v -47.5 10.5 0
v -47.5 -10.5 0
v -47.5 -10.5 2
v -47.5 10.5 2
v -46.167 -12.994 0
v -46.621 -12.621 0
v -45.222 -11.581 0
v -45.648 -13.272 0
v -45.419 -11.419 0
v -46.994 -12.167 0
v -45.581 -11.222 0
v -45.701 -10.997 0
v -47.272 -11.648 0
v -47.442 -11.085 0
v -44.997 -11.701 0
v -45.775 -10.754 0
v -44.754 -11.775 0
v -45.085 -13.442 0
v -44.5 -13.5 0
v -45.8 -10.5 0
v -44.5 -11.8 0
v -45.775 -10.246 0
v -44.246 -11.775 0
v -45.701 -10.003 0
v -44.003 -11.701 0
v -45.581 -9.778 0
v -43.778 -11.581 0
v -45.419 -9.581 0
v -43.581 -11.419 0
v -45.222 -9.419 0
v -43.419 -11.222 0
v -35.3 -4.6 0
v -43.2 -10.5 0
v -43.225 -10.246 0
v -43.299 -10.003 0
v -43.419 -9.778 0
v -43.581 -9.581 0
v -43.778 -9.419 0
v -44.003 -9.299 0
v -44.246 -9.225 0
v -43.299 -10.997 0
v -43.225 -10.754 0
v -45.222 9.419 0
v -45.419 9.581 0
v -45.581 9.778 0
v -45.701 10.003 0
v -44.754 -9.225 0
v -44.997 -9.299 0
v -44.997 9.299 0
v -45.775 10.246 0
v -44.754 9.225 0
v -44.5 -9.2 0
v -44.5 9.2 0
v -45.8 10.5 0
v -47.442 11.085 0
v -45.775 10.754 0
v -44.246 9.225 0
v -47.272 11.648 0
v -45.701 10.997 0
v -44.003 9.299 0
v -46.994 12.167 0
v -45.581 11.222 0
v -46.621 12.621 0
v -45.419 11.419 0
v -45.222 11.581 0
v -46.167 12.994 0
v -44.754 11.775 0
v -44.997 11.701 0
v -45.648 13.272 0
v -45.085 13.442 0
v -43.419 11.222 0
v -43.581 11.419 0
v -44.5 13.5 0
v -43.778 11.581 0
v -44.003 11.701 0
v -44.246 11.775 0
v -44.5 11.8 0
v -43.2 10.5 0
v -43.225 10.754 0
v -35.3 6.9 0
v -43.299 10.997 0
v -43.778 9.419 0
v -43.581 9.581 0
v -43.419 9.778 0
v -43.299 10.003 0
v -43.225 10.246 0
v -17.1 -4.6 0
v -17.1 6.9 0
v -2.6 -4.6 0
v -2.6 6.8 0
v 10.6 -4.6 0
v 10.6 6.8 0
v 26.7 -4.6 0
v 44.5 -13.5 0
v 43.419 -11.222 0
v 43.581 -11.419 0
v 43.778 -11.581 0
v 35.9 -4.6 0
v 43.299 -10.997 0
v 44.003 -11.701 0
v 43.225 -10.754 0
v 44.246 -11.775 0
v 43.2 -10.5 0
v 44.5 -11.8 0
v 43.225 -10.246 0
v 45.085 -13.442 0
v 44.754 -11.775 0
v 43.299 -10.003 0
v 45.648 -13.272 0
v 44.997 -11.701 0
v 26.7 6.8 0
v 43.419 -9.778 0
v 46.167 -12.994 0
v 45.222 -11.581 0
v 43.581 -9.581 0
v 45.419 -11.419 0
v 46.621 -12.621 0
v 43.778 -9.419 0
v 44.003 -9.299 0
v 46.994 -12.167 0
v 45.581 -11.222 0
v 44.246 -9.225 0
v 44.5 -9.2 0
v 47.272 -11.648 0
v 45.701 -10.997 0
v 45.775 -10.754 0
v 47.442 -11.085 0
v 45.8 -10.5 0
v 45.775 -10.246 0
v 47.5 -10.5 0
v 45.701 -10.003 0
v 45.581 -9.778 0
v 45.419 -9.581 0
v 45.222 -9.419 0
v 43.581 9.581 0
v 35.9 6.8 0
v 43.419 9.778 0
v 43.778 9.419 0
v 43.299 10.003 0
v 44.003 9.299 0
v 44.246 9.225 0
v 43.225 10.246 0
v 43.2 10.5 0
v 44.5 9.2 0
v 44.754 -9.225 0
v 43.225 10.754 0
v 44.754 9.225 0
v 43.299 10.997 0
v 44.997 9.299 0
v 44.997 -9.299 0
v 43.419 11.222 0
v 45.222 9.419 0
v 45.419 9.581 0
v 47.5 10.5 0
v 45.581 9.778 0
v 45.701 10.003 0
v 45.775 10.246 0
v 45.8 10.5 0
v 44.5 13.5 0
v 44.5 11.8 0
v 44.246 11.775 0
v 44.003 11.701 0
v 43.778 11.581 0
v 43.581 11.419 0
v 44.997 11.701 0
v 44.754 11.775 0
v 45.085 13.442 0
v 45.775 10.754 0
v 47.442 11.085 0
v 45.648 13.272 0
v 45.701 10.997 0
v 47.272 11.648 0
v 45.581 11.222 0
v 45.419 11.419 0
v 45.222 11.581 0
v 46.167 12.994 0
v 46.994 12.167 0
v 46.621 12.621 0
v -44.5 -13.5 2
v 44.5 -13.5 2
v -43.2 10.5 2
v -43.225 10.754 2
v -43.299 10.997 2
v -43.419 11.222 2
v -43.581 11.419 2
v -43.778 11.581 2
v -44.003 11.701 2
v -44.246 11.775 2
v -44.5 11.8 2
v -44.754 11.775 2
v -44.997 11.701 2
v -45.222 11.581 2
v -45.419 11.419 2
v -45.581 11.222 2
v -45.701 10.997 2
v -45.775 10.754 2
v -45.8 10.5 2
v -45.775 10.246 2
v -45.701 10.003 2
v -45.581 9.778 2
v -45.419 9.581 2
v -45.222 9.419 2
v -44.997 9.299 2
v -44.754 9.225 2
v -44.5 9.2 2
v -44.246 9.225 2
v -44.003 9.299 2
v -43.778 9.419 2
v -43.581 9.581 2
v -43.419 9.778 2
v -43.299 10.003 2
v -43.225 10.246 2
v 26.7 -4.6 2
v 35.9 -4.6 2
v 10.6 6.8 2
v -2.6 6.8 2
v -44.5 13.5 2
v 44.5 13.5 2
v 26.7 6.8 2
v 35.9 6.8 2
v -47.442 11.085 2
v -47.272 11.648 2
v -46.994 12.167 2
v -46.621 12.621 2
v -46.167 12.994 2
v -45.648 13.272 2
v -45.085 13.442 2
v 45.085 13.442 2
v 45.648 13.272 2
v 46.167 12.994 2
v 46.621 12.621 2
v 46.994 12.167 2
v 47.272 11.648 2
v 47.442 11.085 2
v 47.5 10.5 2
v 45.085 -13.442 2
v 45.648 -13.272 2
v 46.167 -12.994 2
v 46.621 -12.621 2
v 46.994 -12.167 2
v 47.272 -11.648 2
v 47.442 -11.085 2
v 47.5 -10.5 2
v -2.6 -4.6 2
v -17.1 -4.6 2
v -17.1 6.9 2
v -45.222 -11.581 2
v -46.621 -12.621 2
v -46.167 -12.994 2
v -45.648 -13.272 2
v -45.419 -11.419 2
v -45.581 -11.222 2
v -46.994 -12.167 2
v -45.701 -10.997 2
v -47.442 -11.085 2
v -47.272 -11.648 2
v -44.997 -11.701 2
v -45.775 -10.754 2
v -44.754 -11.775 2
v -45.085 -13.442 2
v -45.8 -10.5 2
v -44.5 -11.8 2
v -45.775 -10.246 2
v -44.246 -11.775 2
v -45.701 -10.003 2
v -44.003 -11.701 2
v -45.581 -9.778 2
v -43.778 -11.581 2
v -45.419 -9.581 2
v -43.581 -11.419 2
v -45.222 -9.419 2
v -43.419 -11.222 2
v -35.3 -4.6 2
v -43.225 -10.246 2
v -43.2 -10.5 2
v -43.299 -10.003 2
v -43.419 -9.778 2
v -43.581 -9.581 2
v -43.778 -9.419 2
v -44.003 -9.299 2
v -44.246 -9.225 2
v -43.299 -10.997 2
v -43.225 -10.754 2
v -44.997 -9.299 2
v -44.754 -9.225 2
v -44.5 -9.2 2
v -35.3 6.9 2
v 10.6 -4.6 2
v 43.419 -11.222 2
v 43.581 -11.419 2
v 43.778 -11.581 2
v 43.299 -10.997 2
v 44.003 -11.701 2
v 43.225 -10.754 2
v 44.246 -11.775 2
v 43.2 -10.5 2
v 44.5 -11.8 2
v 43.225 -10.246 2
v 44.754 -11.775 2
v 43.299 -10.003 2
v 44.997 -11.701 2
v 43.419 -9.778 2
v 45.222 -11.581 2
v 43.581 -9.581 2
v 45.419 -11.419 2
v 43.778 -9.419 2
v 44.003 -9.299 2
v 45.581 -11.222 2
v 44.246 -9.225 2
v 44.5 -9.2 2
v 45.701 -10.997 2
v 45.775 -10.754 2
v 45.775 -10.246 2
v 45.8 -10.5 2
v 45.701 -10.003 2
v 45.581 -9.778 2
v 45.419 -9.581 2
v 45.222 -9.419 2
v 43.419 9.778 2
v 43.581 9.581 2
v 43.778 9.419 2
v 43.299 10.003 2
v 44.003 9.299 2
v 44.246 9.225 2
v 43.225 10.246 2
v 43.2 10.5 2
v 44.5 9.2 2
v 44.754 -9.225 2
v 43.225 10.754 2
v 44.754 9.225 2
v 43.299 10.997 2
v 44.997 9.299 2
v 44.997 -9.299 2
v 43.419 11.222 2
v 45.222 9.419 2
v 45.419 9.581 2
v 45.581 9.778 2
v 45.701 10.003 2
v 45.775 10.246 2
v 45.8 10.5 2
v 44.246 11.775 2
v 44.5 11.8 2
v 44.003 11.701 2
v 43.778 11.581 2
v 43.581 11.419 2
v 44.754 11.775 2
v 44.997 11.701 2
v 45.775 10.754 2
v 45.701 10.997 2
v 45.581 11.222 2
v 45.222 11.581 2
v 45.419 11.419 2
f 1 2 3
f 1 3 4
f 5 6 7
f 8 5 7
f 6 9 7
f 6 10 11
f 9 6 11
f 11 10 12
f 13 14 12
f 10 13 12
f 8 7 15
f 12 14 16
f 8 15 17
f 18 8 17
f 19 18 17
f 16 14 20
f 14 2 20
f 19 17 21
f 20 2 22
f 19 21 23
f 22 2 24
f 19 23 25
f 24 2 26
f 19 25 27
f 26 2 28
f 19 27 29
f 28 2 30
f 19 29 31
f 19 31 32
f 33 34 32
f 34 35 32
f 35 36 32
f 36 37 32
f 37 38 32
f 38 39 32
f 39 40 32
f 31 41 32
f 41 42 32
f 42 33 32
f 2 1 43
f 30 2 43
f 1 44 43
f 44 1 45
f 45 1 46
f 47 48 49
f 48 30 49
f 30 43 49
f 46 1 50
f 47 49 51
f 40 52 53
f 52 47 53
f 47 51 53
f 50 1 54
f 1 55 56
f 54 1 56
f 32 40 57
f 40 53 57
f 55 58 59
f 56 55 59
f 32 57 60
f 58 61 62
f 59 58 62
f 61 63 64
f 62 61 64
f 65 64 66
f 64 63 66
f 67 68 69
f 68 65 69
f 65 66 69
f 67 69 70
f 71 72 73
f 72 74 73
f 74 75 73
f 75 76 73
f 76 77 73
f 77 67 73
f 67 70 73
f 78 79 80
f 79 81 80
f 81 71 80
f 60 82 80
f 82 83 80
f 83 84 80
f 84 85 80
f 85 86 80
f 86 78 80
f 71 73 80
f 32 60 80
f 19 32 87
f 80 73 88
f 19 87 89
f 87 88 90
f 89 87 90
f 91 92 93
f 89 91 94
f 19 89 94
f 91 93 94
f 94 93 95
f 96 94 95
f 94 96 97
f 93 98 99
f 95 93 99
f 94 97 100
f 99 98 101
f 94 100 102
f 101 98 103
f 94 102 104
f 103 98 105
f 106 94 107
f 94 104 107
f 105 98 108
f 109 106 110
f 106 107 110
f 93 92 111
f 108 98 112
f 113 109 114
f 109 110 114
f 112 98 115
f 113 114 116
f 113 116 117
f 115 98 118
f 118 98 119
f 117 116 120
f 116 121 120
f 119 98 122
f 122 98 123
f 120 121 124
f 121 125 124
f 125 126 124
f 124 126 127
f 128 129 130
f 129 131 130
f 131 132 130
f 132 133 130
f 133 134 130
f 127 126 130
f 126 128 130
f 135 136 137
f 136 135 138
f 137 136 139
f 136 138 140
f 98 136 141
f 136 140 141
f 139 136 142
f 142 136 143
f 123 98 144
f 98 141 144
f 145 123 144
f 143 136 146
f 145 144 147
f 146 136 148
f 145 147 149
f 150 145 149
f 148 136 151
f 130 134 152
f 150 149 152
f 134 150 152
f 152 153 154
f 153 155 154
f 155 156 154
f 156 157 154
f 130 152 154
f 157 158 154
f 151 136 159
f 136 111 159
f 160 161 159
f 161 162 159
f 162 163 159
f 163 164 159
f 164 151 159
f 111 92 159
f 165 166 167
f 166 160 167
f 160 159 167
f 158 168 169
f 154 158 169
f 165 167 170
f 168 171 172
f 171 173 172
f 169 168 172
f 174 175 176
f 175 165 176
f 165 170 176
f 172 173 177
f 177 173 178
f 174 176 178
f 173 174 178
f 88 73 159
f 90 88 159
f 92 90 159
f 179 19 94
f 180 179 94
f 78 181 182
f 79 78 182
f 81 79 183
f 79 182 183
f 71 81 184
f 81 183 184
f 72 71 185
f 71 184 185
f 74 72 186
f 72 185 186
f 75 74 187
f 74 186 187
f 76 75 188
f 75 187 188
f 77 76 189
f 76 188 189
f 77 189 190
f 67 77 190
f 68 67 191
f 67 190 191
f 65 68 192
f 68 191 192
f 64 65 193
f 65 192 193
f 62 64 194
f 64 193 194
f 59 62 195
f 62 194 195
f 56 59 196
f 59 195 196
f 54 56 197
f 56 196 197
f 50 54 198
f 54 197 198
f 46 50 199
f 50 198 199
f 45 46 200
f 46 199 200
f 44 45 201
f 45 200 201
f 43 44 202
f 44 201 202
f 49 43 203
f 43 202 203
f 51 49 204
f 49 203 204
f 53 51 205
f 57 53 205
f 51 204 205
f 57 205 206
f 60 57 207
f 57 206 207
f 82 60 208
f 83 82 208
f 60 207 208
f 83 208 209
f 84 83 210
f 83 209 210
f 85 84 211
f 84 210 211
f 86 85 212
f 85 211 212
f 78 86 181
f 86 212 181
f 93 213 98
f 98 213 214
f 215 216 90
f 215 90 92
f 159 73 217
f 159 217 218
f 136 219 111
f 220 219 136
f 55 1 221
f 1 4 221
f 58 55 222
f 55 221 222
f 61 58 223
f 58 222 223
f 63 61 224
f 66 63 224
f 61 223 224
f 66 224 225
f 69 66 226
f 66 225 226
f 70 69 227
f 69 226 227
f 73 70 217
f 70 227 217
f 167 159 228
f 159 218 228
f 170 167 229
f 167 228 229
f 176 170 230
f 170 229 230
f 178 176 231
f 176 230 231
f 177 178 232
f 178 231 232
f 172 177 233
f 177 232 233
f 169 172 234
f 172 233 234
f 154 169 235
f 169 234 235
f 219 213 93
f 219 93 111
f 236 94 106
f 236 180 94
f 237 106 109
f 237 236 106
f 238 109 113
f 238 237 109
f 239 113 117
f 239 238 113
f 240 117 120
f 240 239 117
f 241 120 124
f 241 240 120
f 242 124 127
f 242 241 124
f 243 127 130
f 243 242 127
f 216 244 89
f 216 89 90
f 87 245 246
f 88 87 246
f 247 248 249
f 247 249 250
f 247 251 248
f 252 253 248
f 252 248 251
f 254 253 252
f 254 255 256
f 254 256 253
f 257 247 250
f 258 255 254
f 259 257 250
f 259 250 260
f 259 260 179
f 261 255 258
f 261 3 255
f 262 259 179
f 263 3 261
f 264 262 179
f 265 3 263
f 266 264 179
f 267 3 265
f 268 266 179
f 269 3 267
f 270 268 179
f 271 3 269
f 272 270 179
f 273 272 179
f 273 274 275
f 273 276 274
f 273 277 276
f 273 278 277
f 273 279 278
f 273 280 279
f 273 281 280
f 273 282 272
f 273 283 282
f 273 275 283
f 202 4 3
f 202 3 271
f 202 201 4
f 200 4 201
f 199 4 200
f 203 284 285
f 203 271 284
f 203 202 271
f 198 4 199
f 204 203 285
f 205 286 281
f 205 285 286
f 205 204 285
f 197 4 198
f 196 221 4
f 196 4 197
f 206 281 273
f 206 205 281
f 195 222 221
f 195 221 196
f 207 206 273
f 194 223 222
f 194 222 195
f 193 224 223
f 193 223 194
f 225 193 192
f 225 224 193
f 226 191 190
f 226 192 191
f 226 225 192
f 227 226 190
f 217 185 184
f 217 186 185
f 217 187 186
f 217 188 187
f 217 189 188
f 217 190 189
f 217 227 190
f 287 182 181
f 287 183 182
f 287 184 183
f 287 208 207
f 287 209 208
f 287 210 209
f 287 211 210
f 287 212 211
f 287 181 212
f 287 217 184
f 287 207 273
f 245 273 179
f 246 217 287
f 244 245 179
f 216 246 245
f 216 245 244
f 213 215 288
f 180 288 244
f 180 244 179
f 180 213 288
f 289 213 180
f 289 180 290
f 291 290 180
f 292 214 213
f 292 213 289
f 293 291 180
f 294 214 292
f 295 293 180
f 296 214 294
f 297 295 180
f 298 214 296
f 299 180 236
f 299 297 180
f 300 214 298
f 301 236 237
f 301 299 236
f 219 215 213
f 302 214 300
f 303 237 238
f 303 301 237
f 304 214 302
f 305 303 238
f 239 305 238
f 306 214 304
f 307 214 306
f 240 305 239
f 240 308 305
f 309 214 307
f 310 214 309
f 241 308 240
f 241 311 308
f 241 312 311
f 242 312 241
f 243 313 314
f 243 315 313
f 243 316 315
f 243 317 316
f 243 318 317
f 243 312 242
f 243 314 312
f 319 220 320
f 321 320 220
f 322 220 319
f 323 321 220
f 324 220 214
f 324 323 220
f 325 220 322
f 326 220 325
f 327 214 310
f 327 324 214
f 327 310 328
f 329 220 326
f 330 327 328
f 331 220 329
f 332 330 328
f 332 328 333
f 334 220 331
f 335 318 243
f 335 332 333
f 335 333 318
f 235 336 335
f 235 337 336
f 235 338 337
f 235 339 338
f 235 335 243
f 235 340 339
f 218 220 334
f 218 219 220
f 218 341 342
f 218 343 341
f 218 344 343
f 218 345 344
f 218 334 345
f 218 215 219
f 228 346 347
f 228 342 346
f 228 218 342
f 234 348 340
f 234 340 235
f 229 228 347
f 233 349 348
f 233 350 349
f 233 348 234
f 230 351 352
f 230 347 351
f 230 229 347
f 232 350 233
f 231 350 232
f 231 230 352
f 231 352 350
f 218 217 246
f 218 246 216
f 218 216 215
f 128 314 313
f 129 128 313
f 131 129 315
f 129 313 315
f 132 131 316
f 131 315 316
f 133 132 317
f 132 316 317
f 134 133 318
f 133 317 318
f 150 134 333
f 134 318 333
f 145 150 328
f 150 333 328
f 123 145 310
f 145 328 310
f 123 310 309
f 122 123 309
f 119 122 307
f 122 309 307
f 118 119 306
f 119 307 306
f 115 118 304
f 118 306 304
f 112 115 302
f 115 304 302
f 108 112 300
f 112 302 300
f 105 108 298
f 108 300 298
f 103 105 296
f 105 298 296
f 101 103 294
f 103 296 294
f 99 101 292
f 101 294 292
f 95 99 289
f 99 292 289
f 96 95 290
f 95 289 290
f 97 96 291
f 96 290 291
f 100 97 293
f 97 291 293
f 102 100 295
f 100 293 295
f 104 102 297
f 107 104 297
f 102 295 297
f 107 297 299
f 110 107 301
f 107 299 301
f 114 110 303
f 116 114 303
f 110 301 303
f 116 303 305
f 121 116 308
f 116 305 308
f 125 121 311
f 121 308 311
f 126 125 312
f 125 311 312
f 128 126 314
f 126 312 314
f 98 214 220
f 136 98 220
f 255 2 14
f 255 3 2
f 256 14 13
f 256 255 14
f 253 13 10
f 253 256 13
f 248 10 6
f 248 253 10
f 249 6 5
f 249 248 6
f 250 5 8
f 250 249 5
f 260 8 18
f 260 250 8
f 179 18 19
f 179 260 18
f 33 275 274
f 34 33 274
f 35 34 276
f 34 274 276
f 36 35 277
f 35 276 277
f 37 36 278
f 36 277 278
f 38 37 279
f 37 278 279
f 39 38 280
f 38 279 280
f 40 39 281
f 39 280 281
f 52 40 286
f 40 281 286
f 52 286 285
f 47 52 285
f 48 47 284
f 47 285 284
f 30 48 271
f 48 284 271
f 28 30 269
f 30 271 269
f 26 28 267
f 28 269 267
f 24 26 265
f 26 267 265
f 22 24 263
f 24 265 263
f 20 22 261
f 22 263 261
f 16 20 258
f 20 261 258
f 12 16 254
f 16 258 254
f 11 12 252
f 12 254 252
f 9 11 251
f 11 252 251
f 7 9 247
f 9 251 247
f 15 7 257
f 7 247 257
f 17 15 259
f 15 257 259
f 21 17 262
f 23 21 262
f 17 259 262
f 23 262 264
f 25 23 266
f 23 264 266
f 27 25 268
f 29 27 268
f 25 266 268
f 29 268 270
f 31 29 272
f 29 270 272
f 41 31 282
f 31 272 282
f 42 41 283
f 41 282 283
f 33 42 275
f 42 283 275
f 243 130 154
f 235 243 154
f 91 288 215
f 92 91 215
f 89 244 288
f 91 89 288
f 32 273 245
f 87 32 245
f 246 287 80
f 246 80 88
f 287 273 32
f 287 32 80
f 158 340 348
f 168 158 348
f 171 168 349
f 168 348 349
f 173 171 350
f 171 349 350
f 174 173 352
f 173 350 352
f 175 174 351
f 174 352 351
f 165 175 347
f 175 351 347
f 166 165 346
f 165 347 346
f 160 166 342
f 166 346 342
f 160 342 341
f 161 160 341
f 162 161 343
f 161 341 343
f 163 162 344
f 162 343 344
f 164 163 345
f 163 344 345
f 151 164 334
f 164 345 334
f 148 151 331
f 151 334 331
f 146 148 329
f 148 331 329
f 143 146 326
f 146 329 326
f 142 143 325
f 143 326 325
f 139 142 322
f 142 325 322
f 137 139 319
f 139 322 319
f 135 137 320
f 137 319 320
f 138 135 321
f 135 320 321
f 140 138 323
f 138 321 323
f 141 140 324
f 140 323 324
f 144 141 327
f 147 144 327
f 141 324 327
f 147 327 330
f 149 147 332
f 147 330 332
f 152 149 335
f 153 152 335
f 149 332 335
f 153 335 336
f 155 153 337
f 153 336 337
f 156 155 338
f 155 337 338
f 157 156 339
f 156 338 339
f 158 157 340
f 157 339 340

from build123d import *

# Parameters (mm, degrees)
SKETCH_W        = 95
SKETCH_H        = 27
PAD_DEPTH       = 2
SKETCH001_R     = 1.3
POCKET_DEPTH    = 2
FILLET_R        = 3
SKETCH002_W     = 9.2
SKETCH002_H     = 11.4
POCKET001_DEPTH = 2
SKETCH003_W     = 13.2
SKETCH003_H     = 11.4
SKETCH003_W_2   = 18.2
SKETCH003_H_2   = 11.5
POCKET002_DEPTH = 2


with BuildPart() as part:
    # Sketch → Pad (new body)
    with BuildSketch(Plane.XY):
        Rectangle(SKETCH_W, SKETCH_H)
    extrude(amount=PAD_DEPTH)

    # Sketch001 (on Face6 of Pad) → Pocket (cut)
    with BuildSketch(Plane.XY.offset(2)):
        with Locations((-44.5, 10.5)):
            Circle(SKETCH001_R)
        with Locations((44.5, 10.5)):
            Circle(SKETCH001_R)
        with Locations((44.5, -10.5)):
            Circle(SKETCH001_R)
        with Locations((-44.5, -10.5)):
            Circle(SKETCH001_R)
    extrude(amount=-POCKET_DEPTH, mode=Mode.SUBTRACT)

    # Fillet
    fillet_edges = [part.edges().sort_by_distance(p)[0] for p in [
        (-47.5, -13.5, 1),
        (47.5, -13.5, 1),
        (47.5, 13.5, 1),
        (-47.5, 13.5, 1),
    ]]
    fillet(fillet_edges, radius=FILLET_R)

    # Sketch002 (on Face5 of Fillet) → Pocket001 (cut)
    with BuildSketch(Plane.XY.offset(2)):
        with Locations((31.3, 1.1)):
            Rectangle(SKETCH002_W, SKETCH002_H)
    extrude(amount=-POCKET001_DEPTH, mode=Mode.SUBTRACT)

    # Sketch003 (on Face5 of Pocket001) → Pocket002 (cut)
    with BuildSketch(Plane.XY.offset(2)):
        with Locations((4, 1.1)):
            Rectangle(SKETCH003_W, SKETCH003_H)
        with Locations((-26.2, 1.15)):
            Rectangle(SKETCH003_W_2, SKETCH003_H_2)
    extrude(amount=-POCKET002_DEPTH, mode=Mode.SUBTRACT)


solid = part.part
